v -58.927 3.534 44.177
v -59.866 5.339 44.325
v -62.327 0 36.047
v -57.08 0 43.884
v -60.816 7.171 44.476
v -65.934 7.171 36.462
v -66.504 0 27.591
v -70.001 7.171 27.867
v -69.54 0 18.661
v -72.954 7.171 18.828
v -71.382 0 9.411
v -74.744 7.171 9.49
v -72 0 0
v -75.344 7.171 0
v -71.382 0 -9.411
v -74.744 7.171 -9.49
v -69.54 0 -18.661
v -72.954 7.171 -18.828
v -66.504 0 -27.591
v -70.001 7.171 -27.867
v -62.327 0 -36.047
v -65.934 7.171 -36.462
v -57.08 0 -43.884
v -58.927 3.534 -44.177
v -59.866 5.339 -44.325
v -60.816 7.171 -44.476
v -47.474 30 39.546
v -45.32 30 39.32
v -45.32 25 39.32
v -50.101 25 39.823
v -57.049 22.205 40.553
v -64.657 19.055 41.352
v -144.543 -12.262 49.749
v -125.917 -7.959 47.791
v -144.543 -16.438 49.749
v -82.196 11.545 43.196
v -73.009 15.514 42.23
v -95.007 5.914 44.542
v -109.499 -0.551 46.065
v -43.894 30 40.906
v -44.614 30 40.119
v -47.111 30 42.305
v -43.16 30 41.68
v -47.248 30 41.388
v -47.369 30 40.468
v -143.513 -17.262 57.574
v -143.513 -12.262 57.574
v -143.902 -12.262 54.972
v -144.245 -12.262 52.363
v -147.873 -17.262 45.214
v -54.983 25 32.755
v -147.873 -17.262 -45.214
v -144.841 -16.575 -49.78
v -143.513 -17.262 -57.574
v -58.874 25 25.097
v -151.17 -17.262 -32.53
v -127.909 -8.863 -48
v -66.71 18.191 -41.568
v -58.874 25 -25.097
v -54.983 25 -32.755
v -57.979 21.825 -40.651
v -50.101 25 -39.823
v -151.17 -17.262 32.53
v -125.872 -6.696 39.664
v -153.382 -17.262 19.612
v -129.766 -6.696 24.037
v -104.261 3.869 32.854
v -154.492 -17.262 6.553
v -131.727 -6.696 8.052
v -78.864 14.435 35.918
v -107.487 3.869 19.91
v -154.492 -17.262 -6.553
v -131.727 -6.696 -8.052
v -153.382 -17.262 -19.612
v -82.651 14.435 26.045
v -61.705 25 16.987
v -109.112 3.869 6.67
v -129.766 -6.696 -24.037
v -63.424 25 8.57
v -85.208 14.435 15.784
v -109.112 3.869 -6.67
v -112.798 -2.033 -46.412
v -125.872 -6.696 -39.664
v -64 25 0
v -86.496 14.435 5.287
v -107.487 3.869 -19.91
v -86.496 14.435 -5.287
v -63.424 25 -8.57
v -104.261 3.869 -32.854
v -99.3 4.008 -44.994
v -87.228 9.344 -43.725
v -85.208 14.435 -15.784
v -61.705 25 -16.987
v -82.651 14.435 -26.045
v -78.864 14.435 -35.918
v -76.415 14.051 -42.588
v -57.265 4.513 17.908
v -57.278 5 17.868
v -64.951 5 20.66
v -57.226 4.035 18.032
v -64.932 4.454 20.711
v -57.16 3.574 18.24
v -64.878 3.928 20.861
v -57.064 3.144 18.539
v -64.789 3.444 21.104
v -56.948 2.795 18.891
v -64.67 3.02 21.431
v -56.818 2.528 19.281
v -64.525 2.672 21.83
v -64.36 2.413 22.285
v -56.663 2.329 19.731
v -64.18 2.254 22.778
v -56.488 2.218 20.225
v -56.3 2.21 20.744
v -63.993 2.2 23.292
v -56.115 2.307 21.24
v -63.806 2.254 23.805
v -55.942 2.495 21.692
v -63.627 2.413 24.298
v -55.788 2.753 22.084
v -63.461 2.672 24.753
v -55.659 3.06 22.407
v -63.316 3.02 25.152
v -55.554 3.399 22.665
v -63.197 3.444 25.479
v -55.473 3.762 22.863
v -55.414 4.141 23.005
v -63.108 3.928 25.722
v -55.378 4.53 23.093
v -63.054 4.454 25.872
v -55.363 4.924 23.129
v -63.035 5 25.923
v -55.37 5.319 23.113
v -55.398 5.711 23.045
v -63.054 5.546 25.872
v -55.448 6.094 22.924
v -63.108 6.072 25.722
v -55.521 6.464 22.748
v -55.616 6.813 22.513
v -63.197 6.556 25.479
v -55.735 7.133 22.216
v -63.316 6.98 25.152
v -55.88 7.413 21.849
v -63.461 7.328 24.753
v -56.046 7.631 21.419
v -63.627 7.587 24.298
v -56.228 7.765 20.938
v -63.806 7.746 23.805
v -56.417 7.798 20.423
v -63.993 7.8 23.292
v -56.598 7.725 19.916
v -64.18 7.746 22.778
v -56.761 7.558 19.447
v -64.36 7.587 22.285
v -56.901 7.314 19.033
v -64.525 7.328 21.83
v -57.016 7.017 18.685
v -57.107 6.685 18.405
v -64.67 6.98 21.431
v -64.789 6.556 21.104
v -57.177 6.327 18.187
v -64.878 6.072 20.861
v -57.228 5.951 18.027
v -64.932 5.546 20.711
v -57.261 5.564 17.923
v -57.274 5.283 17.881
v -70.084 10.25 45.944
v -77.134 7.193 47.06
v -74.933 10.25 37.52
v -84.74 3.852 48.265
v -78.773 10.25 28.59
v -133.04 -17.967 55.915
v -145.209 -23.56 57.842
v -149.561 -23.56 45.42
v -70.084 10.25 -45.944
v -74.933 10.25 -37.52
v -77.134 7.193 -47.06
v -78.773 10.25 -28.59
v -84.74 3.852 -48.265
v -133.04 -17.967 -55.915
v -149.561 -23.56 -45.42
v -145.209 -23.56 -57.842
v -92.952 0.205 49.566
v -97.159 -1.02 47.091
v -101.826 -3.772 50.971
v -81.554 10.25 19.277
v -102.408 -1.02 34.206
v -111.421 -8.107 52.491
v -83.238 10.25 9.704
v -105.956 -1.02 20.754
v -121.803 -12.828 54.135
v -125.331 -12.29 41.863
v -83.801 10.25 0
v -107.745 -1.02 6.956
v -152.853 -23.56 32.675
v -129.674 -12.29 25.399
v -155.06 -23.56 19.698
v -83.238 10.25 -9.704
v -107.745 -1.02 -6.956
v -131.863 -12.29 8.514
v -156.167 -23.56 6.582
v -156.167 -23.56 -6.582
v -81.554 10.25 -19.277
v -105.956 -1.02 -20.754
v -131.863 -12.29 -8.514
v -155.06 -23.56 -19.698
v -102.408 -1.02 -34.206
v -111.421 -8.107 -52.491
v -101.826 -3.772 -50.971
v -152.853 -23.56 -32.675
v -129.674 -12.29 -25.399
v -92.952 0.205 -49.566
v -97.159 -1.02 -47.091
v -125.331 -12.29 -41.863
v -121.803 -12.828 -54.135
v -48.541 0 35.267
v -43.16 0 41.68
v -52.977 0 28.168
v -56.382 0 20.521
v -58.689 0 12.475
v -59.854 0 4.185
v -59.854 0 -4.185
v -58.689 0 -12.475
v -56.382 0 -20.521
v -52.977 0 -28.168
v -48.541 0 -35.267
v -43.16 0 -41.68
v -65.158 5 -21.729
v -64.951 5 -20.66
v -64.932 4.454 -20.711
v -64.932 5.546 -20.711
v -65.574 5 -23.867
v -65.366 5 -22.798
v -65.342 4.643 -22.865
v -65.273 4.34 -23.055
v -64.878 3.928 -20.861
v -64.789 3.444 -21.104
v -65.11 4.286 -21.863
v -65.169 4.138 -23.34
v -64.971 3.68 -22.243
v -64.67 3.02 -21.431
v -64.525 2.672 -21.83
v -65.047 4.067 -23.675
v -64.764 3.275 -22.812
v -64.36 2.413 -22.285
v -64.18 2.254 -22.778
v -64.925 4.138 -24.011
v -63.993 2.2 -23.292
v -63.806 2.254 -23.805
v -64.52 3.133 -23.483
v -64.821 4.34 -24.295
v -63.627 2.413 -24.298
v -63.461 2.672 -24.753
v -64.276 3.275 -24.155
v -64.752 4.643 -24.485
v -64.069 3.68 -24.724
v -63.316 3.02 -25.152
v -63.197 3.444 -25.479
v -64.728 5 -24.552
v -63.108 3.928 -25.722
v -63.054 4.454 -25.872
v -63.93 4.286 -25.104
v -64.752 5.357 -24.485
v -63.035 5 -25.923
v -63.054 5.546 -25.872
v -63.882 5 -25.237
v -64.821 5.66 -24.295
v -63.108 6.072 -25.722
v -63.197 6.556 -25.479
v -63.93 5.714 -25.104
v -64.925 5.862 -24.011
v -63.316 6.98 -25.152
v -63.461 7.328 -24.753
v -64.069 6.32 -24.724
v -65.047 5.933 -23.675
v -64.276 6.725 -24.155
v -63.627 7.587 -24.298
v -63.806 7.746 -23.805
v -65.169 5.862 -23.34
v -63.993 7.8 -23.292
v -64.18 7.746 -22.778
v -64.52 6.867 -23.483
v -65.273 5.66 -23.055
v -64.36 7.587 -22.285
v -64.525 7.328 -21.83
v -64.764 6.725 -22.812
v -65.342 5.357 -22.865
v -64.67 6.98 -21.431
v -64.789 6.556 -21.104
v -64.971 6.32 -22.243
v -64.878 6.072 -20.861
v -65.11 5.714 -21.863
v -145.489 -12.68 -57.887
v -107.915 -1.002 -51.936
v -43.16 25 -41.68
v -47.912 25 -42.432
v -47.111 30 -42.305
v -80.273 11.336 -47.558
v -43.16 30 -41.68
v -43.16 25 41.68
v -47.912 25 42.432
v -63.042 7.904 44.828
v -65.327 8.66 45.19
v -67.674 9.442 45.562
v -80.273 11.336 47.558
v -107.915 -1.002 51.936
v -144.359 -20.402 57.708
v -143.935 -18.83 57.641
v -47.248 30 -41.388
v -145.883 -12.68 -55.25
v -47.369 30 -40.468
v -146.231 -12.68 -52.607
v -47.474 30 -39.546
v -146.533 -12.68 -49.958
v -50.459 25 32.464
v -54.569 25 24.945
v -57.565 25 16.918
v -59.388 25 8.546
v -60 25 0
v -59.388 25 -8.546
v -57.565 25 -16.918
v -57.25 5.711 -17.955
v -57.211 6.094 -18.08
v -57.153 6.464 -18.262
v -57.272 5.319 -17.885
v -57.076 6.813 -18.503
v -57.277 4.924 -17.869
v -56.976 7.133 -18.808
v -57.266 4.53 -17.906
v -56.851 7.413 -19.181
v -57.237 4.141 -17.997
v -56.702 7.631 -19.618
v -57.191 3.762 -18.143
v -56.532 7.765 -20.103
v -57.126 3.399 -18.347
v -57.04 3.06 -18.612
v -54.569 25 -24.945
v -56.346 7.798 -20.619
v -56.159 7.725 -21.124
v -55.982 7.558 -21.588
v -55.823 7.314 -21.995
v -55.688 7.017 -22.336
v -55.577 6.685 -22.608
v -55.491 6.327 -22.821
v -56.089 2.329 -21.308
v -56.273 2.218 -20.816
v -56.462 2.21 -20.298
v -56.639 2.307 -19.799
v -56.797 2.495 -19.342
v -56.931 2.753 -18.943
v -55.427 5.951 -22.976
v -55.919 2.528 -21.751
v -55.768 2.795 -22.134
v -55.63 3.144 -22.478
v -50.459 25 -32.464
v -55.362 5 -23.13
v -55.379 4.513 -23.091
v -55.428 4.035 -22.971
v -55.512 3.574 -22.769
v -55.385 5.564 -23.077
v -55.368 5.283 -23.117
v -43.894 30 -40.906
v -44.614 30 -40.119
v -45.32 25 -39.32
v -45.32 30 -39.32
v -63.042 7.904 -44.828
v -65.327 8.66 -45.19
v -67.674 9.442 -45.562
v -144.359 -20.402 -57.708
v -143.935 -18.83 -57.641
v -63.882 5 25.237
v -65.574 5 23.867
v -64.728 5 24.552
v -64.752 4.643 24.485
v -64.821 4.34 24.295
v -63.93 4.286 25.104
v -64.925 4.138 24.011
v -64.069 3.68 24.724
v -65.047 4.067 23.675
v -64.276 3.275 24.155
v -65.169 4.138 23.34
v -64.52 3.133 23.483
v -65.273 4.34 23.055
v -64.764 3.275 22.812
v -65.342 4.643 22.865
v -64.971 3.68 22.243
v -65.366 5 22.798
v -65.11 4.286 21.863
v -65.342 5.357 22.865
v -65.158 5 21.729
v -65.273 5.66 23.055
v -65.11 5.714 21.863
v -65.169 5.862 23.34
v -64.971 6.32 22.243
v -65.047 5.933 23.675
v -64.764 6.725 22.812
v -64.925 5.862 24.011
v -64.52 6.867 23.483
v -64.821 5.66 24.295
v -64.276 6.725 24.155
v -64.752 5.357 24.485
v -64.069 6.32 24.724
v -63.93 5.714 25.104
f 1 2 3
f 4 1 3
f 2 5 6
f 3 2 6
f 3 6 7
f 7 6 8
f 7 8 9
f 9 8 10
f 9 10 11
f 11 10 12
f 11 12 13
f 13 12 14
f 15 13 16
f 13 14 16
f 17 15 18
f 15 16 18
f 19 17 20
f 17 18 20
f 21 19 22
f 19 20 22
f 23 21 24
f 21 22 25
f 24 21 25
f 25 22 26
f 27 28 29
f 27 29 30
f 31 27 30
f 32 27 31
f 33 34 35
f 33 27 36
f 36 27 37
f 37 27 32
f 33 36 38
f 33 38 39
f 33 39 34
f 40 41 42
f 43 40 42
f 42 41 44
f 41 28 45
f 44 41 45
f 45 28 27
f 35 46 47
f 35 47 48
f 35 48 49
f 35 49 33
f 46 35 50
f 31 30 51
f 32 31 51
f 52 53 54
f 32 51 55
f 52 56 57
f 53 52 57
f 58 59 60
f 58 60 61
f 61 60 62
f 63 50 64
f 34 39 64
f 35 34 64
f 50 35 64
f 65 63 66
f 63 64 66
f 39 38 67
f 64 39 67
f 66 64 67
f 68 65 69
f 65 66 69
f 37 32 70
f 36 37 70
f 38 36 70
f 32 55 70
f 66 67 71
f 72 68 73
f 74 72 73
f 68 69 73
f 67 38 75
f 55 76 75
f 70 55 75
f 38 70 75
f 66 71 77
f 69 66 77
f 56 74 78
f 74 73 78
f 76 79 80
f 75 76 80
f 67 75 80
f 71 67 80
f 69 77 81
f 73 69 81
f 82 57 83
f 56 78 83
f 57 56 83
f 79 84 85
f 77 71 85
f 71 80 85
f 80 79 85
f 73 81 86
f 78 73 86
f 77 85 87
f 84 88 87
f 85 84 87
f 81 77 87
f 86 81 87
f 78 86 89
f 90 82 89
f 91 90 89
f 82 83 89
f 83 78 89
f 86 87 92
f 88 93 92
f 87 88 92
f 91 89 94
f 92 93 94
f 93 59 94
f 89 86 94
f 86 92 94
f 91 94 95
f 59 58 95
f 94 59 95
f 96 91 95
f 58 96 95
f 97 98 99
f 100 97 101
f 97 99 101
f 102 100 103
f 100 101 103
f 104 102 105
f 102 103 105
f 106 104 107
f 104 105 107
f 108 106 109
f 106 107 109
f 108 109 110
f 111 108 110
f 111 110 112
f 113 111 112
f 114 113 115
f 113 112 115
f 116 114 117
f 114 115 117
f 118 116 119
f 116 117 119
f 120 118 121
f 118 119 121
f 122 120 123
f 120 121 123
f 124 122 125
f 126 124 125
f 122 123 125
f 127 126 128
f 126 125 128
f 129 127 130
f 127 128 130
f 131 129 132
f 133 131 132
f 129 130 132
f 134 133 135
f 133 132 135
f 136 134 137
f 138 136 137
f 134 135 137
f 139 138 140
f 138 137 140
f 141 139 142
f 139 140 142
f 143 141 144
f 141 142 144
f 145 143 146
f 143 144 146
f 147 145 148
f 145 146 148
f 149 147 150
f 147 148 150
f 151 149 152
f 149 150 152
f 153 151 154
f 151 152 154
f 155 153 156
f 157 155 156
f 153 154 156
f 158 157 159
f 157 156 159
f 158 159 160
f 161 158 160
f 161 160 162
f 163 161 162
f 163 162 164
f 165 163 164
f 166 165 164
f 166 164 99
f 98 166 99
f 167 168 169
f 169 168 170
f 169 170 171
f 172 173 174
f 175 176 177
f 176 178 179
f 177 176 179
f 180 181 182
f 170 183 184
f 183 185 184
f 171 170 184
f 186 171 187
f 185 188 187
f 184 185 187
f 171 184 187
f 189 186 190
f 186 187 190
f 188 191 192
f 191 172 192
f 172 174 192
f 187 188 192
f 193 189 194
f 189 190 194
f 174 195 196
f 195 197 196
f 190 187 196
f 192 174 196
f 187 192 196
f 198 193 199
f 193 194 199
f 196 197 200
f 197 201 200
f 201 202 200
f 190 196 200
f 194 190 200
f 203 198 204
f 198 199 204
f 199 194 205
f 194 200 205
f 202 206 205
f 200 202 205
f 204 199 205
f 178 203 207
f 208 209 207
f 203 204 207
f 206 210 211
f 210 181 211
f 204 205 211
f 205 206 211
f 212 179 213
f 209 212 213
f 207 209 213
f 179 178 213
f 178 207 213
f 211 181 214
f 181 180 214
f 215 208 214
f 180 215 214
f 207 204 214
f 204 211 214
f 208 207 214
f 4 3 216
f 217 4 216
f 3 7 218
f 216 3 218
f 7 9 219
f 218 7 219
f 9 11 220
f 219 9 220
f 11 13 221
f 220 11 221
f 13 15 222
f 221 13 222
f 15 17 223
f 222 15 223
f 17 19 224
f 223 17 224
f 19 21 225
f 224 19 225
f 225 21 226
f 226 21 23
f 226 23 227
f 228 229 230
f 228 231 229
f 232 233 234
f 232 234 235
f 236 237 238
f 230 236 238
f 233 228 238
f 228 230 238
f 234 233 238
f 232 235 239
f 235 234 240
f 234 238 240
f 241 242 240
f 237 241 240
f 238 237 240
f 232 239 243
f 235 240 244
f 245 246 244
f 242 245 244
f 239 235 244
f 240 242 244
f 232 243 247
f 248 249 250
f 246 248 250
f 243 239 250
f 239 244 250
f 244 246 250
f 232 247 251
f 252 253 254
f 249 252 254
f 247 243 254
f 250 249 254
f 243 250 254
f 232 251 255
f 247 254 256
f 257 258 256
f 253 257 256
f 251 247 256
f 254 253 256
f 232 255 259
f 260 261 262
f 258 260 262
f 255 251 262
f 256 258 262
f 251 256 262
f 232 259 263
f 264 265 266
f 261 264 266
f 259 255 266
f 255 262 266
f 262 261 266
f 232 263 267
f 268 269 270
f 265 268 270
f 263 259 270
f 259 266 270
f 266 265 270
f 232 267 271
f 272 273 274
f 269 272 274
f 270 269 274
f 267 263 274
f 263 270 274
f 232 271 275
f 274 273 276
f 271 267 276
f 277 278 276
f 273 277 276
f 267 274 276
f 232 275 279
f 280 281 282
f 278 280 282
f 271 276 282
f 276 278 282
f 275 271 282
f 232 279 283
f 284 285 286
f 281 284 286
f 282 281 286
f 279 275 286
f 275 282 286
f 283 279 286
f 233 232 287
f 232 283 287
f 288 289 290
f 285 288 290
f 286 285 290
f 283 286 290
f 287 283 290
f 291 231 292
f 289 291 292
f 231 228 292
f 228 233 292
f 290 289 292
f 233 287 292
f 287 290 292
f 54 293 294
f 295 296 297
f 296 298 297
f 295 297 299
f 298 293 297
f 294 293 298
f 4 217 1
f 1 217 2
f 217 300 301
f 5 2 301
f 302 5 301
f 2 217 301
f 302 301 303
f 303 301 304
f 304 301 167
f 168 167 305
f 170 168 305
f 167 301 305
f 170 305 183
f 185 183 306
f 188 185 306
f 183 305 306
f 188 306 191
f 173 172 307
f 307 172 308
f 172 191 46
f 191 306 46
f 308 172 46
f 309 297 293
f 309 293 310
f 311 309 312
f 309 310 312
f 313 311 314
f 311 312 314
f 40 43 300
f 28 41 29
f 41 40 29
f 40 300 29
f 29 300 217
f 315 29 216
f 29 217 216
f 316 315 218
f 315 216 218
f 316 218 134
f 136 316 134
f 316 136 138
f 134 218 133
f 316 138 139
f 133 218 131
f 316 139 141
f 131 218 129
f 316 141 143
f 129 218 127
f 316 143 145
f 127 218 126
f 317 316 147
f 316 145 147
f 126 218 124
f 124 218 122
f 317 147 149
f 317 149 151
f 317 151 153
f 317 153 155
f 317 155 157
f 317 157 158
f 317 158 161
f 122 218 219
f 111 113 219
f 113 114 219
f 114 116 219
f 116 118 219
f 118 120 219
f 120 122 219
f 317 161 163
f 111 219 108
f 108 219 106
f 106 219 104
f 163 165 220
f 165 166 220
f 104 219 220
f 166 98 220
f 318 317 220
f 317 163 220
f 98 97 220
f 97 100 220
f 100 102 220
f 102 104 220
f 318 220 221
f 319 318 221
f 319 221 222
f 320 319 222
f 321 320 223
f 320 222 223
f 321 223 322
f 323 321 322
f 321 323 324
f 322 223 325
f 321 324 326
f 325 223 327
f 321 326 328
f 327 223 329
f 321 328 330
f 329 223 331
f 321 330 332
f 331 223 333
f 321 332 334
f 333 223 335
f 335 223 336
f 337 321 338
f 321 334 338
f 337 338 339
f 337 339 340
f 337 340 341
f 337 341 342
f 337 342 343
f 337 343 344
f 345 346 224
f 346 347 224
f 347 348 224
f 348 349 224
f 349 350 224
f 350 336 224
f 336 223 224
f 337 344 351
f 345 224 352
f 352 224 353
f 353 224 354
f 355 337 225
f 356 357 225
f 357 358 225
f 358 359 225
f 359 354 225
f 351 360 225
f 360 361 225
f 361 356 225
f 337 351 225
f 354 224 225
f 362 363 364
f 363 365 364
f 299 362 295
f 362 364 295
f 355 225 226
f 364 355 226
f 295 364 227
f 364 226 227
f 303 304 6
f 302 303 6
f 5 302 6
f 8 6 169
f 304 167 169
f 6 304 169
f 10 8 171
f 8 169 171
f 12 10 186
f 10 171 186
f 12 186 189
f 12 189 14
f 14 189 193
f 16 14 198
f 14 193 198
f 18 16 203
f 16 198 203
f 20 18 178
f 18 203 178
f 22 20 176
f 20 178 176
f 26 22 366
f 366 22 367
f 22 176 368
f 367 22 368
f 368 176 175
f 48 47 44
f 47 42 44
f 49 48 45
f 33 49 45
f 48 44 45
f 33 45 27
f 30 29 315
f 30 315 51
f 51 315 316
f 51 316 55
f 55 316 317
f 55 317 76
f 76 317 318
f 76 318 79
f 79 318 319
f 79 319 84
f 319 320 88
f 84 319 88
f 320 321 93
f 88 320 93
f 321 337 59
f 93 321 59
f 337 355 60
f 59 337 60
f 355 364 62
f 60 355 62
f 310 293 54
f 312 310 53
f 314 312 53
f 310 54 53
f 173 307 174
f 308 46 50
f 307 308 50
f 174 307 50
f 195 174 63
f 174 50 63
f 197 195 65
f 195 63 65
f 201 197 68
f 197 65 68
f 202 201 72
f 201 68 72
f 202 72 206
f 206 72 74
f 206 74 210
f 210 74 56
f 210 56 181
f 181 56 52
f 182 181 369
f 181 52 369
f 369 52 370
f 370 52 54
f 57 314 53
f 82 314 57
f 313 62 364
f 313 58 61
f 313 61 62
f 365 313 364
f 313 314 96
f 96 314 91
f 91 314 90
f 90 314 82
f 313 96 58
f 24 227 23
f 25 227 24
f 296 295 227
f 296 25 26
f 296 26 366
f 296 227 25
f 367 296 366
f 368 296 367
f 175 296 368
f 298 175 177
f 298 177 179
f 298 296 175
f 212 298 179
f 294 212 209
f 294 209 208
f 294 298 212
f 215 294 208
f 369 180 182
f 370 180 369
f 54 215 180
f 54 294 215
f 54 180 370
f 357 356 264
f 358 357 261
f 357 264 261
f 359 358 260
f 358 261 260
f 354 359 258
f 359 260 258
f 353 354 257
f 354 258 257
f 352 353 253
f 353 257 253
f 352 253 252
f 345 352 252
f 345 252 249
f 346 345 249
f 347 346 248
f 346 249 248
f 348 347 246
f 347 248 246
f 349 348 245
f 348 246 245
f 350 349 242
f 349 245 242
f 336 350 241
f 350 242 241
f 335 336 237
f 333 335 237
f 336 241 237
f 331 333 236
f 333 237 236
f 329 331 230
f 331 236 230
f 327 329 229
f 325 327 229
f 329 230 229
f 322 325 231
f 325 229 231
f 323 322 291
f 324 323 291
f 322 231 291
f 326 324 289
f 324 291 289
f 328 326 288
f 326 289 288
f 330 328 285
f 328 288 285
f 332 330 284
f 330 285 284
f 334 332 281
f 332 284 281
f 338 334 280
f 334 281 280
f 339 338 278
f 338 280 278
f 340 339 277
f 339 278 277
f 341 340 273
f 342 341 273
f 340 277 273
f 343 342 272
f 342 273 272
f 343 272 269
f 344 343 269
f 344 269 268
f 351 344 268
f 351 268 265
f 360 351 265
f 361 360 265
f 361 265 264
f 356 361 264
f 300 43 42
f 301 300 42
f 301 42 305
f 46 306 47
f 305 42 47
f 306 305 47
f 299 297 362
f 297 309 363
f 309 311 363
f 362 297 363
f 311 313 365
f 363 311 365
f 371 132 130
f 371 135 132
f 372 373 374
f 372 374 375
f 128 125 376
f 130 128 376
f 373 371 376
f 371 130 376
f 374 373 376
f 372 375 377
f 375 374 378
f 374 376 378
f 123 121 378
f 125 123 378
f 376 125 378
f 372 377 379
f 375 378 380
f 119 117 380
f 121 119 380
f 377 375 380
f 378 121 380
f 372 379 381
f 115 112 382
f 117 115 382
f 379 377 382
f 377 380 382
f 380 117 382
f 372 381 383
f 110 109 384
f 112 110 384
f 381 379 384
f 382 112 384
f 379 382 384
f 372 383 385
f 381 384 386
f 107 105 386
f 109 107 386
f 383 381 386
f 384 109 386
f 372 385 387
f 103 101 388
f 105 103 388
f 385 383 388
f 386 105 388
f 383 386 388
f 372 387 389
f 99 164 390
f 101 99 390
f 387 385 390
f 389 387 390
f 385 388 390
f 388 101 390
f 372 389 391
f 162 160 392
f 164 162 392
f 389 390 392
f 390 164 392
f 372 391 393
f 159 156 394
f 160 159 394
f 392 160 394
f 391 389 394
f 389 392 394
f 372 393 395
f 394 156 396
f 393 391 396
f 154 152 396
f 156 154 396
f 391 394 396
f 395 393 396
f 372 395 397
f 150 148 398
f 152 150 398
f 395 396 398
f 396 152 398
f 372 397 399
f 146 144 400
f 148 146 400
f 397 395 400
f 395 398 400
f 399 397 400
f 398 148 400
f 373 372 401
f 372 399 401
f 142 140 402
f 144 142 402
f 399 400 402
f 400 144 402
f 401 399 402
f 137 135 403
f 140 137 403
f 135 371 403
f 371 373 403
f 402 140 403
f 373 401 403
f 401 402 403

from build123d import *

# Parameters (mm, degrees)
RIVOLUZIONE1_ANGLE                 = 44
RIVOLUZIONE1_OTHER_WAY_ANGLE       = 44
TAGLIO_ESTRUSIONE1_DEPTH           = 59
FORO_PER_VITE_M4_1_D               = 5.6
FORO_PER_VITE_M4_1_DEPTH           = 8.1
FORO_PER_VITE_M4_1_TIP             = 1.682409733
FORO_PER_VITE_M4_1_ON_FACE_2_D     = 5.6
FORO_PER_VITE_M4_1_ON_FACE_2_DEPTH = 8.1
FORO_PER_VITE_M4_1_ON_FACE_2_TIP   = 1.682409733
RIVOLUZIONE2_ANGLE                 = 3
RIVOLUZIONE3_ANGLE                 = 3
TAGLIO_ESTRUSIONE2_START           = -59
SCHIZZO7_R                         = 60
TAGLIO_ESTRUSIONE2_DEPTH           = 59


with BuildPart() as part:
    # Schizzo1 → Rivoluzione1 (revolve)
    with BuildSketch(Plane(origin=(0, 0, 0), x_dir=(-1, 0, 0), z_dir=(0, 0, -1))):
        Polygon((83.801322108, 10.249602265), (156.30594507, -23.559858674), (154.630778704, -17.261826174), (64, 25), (60, 25), (60, 0), (72, 0), (75.34408852, 7.171420975), align=None)
    revolve(axis=Axis((0, 0, 0), (0, 1, 0)), revolution_arc=RIVOLUZIONE1_ANGLE)

    # Schizzo1 → Rivoluzione1 other way (revolve)
    with BuildSketch(Plane(origin=(0, 0, 0), x_dir=(-1, 0, 0), z_dir=(0, 0, -1))):
        Polygon((83.801322108, 10.249602265), (156.30594507, -23.559858674), (154.630778704, -17.261826174), (64, 25), (60, 25), (60, 0), (72, 0), (75.34408852, 7.171420975), align=None)
    revolve(axis=Axis((0, 0, 0), (0, -1, 0)), revolution_arc=RIVOLUZIONE1_OTHER_WAY_ANGLE)

    # Schizzo6 → Taglio-Estrusione1 (cut)
    with BuildSketch(Plane(origin=(0, 25, 0), x_dir=(1, 0, 0), z_dir=(0, 1, 0))):
        with BuildLine():
            Line((-43.16038802, 41.679502228), (-145.209485409, 57.842491403))
            ThreePointArc((-145.209485409, 57.842491403), (-131.297347075, 84.808932993), (-112.437087319, 108.579233096))
            Line((-112.437087319, 108.579233096), (-43.16038802, 41.679502228))
        make_face()
        with BuildLine():
            Line((-43.16038802, -41.679502228), (-145.209485409, -57.842491403))
            ThreePointArc((-145.209485409, -57.842491403), (-131.297347075, -84.808932993), (-112.437087319, -108.579233096))
            Line((-112.437087319, -108.579233096), (-43.16038802, -41.679502228))
        make_face()
    extrude(amount=-TAGLIO_ESTRUSIONE1_DEPTH, mode=Mode.SUBTRACT)

    # Foro per Vite M4-1
    with Locations(Plane(origin=(-56.381557247, 5, 20.5212086), x_dir=(0.342020143326, 0, 0.939692620786), z_dir=(0.939692620786, 0, -0.342020143326))):
        with Locations((0, 0)):
            Hole(FORO_PER_VITE_M4_1_D / 2, depth=FORO_PER_VITE_M4_1_DEPTH)
            with Locations((0, 0, -(FORO_PER_VITE_M4_1_DEPTH + FORO_PER_VITE_M4_1_TIP / 2))):  # 118° drill point
                Cone(0, FORO_PER_VITE_M4_1_D / 2, FORO_PER_VITE_M4_1_TIP, mode=Mode.SUBTRACT)

    # Foro per Vite M4-1 on face 2
    with Locations(Plane(origin=(-56.381557247, 5.000002473, -20.5212086), x_dir=(-0.342019894889, 0, 0.939692711209), z_dir=(0.939692711209, 0, 0.342019894889))):
        with Locations((0, 0)):
            Hole(FORO_PER_VITE_M4_1_ON_FACE_2_D / 2, depth=FORO_PER_VITE_M4_1_ON_FACE_2_DEPTH)
            with Locations((0, 0, -(FORO_PER_VITE_M4_1_ON_FACE_2_DEPTH + FORO_PER_VITE_M4_1_ON_FACE_2_TIP / 2))):  # 118° drill point
                Cone(0, FORO_PER_VITE_M4_1_ON_FACE_2_D / 2, FORO_PER_VITE_M4_1_ON_FACE_2_TIP, mode=Mode.SUBTRACT)

    # Schizzo2 → Rivoluzione2 (revolve)
    with BuildSketch(Plane(origin=(7.537525881, 0, -33.649741509), x_dir=(-0.9876883405951378, 0, -0.15643446504023117), z_dir=(0.15643446504023117, 0, -0.9876883405951378))):
        Polygon((51.329869775, 25), (51.329869775, 30), (55.329869775, 30), (154.933952788, -12.679561819), (152.933239569, -17.261826174), (56.140326971, 25), align=None)
    revolve(axis=Axis((5.383627379, 0, -33.990885517), (0, 1, 0)), revolution_arc=RIVOLUZIONE2_ANGLE)

    # Schizzo3 → Rivoluzione3 (revolve)
    with BuildSketch(Plane(origin=(7.537525881, 0, 33.649741509), x_dir=(0.9876883405951378, 0, -0.15643446504023112), z_dir=(0.15643446504023112, 0, 0.9876883405951378))):
        Polygon((-51.329869775, 25), (-56.140326971, 25), (-152.933239569, -17.261826174), (-152.933239569, -12.261826174), (-55.329869775, 30), (-51.329869775, 30), align=None)
    revolve(axis=Axis((5.383627379, 0, 33.990885517), (0, -1, 0)), revolution_arc=RIVOLUZIONE3_ANGLE)

    # Schizzo7 → Taglio-Estrusione2 (cut)
    with BuildSketch(Plane(origin=(0, 30, 0), x_dir=(1, 0, 0), z_dir=(0, 1, 0)).offset(TAGLIO_ESTRUSIONE2_START)):
        Circle(SCHIZZO7_R)
    extrude(amount=TAGLIO_ESTRUSIONE2_DEPTH, mode=Mode.SUBTRACT)


solid = part.part
